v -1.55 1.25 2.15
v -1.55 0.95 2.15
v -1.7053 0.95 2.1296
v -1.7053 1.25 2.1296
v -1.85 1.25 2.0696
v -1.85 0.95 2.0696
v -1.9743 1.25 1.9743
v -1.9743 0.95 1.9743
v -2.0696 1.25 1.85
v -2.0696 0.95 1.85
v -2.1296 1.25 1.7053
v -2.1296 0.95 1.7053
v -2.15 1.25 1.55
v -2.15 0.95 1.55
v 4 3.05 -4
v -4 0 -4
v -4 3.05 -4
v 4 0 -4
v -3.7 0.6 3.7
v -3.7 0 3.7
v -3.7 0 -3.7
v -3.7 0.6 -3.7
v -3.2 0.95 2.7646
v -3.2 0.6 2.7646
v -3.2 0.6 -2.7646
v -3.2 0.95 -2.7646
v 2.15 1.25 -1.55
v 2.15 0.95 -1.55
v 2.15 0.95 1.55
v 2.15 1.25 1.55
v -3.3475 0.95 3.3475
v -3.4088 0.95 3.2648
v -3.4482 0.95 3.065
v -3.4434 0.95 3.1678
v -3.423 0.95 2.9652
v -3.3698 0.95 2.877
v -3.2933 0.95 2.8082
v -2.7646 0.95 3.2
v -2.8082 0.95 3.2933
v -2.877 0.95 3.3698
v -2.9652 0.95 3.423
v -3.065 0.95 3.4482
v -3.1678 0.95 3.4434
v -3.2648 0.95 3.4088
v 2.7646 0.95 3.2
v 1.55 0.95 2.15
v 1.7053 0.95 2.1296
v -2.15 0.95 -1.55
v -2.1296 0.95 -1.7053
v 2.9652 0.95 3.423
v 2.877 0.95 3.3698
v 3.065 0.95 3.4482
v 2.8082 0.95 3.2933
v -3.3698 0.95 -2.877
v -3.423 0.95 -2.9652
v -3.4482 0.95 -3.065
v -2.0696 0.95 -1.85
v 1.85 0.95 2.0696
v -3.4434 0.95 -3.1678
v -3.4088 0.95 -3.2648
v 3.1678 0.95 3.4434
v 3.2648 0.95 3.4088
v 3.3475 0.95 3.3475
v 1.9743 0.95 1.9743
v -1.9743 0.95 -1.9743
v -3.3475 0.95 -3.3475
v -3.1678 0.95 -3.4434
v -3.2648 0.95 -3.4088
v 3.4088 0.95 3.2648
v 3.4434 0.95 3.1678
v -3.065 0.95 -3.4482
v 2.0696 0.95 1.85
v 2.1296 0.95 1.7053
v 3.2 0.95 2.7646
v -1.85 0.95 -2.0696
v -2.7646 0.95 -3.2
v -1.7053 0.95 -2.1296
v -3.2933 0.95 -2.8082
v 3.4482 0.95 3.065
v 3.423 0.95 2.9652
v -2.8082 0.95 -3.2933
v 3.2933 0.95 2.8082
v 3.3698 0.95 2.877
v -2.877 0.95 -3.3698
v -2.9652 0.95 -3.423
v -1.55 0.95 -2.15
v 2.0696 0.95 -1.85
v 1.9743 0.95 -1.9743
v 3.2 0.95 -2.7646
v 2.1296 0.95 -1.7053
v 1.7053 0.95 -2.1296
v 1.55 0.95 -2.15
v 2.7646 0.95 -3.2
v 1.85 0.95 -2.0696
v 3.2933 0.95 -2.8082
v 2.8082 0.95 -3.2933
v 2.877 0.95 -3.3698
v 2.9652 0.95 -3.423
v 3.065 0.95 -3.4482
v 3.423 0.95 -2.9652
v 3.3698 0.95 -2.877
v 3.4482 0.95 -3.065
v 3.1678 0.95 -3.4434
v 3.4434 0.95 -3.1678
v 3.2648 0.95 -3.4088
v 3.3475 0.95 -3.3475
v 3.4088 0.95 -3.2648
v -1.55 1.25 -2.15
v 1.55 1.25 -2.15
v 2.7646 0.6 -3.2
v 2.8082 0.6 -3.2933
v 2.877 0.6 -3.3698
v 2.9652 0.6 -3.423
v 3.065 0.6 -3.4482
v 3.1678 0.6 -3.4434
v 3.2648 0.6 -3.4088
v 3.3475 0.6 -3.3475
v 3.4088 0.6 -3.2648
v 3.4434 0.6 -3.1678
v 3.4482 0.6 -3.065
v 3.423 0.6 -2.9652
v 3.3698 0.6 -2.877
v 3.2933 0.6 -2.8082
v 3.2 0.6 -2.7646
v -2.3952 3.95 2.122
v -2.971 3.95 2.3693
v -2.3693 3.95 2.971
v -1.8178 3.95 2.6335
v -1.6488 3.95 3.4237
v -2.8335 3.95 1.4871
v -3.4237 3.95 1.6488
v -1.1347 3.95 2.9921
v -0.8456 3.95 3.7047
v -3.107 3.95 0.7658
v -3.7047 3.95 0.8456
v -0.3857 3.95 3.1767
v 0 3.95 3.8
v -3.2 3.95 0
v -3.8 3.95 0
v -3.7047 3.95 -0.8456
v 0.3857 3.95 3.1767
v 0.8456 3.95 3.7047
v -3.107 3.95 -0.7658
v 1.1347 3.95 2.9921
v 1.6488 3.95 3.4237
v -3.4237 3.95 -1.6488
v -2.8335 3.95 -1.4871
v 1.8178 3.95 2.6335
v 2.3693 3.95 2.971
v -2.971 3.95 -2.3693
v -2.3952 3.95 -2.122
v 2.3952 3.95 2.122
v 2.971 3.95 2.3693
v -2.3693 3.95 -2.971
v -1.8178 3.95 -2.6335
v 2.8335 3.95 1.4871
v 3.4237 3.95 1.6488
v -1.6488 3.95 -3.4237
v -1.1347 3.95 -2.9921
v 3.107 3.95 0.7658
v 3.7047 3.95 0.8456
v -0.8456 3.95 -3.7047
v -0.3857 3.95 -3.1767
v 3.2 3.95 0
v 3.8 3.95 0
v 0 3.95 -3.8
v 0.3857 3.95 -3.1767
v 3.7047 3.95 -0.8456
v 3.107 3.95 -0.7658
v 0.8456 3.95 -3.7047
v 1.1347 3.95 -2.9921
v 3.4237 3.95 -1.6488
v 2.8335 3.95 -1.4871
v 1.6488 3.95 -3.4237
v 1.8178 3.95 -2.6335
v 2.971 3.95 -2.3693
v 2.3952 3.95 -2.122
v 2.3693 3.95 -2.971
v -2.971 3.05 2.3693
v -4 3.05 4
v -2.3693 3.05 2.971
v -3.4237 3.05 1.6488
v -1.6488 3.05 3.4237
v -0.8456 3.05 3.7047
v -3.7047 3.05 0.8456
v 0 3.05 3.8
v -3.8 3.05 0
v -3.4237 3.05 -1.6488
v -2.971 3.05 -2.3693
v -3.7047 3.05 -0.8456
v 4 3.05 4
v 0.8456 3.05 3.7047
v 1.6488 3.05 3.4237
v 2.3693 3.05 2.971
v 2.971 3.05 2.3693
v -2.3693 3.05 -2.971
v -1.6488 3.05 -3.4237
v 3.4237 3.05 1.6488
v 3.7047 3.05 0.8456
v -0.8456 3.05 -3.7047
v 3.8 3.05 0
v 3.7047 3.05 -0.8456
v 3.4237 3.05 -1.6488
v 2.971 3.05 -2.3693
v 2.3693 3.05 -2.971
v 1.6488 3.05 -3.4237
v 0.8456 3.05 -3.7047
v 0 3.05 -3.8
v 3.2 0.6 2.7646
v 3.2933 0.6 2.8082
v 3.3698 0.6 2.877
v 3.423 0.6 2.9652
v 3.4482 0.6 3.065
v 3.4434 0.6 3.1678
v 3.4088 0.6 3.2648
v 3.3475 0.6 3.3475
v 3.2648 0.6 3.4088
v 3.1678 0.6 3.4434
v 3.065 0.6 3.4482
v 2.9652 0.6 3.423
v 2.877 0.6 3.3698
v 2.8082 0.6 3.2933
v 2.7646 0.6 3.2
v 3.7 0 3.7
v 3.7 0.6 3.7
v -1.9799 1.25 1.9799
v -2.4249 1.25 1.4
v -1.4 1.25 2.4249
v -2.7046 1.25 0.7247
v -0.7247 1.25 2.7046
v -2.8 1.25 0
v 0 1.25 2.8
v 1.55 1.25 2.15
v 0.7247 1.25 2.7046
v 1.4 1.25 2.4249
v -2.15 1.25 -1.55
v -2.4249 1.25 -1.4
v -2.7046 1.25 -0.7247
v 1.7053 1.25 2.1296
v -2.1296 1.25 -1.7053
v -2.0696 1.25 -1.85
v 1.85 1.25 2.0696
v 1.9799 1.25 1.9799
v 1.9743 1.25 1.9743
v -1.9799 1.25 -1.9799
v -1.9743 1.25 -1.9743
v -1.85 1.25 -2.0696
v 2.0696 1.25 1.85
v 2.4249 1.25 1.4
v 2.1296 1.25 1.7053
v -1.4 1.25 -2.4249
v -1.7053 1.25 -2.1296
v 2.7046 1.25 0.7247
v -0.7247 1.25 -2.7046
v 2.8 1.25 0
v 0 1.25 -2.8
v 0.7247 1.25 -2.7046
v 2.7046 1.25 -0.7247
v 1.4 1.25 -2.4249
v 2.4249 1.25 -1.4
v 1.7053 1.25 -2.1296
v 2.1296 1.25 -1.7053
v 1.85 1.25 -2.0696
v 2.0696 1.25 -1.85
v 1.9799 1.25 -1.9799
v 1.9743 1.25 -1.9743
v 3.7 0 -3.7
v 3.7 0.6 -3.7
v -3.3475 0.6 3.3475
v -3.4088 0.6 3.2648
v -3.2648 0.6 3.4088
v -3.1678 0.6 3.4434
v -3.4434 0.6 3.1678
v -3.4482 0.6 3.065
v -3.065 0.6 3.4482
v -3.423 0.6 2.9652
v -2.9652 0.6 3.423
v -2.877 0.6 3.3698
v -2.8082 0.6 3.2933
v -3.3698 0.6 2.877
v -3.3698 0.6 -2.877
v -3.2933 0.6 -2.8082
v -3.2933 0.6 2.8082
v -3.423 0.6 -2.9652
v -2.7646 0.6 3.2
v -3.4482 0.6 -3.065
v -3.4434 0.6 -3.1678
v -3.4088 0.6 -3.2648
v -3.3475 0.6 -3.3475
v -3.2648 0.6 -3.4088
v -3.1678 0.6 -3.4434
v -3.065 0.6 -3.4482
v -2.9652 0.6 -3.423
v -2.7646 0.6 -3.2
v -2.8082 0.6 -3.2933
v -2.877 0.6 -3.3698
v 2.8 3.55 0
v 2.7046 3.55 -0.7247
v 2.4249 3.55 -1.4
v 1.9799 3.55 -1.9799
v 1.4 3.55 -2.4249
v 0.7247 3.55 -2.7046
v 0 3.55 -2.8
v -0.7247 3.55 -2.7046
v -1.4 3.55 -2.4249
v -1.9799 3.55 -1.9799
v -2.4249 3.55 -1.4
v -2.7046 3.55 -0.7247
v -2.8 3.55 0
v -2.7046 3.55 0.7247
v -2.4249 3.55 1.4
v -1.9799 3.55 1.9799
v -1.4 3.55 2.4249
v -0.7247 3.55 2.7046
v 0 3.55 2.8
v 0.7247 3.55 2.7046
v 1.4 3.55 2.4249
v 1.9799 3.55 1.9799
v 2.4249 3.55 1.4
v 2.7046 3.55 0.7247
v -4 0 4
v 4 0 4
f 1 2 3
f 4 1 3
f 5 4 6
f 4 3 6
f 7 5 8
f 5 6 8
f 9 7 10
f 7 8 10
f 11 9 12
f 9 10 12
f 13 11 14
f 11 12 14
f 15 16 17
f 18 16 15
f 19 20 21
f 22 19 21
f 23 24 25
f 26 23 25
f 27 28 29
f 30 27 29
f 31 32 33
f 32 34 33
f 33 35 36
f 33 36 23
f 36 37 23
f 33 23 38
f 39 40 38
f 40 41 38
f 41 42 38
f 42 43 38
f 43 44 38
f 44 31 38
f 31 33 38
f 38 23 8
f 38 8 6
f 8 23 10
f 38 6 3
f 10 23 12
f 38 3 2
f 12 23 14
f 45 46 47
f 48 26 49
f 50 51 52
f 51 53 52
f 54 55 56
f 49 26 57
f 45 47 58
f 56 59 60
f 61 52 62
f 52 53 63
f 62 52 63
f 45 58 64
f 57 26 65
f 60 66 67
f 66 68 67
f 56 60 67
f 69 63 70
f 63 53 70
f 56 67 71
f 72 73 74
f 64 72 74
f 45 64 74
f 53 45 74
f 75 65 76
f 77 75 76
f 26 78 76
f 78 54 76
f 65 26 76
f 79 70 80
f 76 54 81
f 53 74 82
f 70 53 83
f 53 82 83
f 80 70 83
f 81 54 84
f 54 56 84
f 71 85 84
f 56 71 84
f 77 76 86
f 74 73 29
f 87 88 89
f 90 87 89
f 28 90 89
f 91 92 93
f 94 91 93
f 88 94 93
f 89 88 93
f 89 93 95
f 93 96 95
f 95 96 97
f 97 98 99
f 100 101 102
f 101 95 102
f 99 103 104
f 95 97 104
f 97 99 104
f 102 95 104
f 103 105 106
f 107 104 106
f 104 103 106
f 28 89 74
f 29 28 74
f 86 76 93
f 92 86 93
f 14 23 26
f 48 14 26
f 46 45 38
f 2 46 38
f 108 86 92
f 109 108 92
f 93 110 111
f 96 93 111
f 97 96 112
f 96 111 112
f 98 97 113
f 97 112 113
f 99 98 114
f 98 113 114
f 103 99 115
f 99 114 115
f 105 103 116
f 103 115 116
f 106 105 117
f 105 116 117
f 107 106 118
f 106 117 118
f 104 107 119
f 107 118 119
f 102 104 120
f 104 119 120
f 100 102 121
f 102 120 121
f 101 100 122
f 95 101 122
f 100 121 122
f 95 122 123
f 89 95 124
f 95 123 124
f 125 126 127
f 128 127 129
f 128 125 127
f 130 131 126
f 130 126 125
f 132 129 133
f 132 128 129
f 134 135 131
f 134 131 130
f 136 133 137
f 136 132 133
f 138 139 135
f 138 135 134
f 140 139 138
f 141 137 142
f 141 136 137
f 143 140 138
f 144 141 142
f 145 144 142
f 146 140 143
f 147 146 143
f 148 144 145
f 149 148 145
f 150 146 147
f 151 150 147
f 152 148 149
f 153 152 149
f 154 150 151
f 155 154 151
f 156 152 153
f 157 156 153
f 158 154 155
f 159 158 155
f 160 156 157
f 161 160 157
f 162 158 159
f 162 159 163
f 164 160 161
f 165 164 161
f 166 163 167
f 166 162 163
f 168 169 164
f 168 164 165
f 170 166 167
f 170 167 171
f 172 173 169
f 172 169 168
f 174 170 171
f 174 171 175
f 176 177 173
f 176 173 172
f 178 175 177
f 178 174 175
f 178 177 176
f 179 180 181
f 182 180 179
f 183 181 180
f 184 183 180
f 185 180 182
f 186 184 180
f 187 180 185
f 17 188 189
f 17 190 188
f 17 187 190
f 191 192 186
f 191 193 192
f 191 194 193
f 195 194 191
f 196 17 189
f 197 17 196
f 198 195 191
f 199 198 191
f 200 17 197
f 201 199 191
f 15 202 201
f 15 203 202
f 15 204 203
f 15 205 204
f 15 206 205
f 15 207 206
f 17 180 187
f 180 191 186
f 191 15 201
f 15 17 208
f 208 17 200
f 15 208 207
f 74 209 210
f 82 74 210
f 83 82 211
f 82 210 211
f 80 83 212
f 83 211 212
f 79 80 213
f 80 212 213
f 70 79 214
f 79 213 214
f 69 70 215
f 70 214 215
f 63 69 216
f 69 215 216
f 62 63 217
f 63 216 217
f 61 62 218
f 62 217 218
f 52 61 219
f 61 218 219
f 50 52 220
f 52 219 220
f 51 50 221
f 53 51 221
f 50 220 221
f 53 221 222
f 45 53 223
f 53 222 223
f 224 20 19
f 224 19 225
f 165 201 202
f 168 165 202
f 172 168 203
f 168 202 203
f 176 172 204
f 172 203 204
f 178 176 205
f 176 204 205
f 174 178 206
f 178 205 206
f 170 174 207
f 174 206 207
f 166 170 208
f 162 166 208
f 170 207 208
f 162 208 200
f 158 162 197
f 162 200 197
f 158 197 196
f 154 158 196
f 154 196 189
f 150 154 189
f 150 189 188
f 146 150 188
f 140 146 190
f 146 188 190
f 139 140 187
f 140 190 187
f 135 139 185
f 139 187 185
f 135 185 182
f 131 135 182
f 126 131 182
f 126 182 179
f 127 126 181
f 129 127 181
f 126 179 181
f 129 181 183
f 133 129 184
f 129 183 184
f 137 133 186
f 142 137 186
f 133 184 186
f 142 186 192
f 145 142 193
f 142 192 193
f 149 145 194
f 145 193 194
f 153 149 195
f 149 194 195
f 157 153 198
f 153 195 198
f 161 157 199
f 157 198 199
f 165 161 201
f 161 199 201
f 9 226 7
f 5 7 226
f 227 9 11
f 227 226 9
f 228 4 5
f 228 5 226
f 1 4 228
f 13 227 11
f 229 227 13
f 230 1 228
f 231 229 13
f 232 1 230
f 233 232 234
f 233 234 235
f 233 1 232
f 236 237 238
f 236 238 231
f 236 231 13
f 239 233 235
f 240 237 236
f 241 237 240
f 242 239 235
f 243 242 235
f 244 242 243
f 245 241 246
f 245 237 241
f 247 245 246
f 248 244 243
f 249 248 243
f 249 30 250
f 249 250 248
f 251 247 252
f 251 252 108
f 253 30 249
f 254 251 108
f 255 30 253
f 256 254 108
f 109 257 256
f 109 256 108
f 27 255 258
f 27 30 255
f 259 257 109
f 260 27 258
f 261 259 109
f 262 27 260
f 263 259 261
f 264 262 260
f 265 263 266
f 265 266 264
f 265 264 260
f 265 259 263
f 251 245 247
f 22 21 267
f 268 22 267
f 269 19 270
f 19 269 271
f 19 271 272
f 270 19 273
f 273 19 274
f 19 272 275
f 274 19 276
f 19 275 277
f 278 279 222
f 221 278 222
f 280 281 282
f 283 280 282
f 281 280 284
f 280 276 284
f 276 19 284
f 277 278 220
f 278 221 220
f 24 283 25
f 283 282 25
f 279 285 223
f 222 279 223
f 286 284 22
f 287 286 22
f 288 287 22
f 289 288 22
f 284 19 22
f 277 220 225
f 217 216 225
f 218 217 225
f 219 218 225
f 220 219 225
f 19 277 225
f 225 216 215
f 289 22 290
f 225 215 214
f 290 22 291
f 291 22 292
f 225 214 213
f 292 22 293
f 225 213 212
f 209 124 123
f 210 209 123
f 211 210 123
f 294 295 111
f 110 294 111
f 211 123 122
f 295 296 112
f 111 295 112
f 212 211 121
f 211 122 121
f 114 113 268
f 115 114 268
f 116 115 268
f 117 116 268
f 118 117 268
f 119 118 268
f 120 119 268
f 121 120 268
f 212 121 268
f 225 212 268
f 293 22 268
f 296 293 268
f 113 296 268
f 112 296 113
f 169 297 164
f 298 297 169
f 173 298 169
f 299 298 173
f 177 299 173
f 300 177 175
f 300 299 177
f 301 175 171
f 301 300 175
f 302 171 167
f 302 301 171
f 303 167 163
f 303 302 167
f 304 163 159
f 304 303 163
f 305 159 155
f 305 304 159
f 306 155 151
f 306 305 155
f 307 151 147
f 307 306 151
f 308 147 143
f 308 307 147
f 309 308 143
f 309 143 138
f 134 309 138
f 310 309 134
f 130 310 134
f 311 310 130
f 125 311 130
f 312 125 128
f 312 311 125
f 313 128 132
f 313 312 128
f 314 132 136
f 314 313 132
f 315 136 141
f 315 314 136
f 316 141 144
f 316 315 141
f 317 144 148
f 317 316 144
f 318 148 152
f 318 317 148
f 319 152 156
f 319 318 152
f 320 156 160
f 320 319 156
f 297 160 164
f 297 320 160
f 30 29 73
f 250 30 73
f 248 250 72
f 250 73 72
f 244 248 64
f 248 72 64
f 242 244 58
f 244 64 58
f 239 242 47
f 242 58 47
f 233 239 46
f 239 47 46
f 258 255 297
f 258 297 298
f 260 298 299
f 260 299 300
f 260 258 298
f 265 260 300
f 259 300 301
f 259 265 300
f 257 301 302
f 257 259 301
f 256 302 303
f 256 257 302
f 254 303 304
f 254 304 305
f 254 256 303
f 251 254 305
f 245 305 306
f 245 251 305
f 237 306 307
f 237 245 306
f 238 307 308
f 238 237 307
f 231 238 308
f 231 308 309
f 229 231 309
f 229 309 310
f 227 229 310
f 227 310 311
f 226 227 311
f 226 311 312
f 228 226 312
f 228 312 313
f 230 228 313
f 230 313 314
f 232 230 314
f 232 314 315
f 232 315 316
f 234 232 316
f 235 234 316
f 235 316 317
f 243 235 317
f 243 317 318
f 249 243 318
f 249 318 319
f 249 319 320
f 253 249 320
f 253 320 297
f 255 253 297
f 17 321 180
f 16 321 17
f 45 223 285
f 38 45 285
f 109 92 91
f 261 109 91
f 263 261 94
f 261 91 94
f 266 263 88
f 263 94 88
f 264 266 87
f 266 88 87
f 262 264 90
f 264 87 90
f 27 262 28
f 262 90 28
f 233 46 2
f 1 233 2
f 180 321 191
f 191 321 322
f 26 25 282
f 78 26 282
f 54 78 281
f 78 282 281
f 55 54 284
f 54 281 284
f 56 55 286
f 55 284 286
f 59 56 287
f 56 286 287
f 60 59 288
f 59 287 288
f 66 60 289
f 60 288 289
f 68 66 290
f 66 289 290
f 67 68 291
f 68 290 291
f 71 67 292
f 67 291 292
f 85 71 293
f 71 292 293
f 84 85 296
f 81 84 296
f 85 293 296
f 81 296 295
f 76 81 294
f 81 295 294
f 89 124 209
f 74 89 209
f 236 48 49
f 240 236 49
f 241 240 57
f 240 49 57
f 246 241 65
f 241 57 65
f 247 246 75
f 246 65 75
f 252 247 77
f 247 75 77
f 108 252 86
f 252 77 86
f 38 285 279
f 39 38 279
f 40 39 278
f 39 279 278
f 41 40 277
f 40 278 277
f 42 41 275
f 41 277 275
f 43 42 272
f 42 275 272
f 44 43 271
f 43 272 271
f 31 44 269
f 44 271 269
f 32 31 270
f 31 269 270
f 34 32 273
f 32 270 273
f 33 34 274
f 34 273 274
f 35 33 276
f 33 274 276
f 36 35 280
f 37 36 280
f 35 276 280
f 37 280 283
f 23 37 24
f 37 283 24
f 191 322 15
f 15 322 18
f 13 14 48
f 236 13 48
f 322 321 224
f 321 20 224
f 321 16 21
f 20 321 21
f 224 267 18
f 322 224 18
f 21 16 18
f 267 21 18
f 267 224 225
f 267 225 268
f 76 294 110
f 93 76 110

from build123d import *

# Parameters (mm, degrees)
SKIZZE2_W                       = 8
SKIZZE2_H                       = 8
SKIZZE2_W_2                     = 7.4
SKIZZE2_H_2                     = 7.4
AUFSATZ_LINEAR_AUSTRAGEN1_DEPTH = 0.6
SKIZZE5_W                       = 8
SKIZZE5_H                       = 8
AUFSATZ_LINEAR_AUSTRAGEN3_DEPTH = 0.35
SKIZZE4_W                       = 8
SKIZZE4_H                       = 8
AUFSATZ_LINEAR_AUSTRAGEN2_DEPTH = 0.3
SKIZZE7_W                       = 8
SKIZZE7_H                       = 8
SKIZZE7_R                       = 2.8
AUFSATZ_LINEAR_AUSTRAGEN4_DEPTH = 1.8
SKIZZE8_R                       = 3.8
SKIZZE8_R_2                     = 2.8
AUFSATZ_LINEAR_AUSTRAGEN5_DEPTH = 0.9
FASE1_SIZE                      = 0.4


with BuildPart() as part:
    # Skizze2 → Aufsatz-Linear austragen1 (new body)
    with BuildSketch(Plane(origin=(0, 0, 0), x_dir=(1, 0, 0), z_dir=(0, 1, 0))):
        Rectangle(SKIZZE2_W, SKIZZE2_H)
        Rectangle(SKIZZE2_W_2, SKIZZE2_H_2, mode=Mode.SUBTRACT)
    extrude(amount=AUFSATZ_LINEAR_AUSTRAGEN1_DEPTH)

    # Skizze5 → Aufsatz-Linear austragen3 (add)
    with BuildSketch(Plane(origin=(0, 0.6, 0), x_dir=(1, 0, 0), z_dir=(0, 1, 0))):
        Rectangle(SKIZZE5_W, SKIZZE5_H)
        with BuildLine():
            Line((-2.764589803, 3.2), (2.764589803, 3.2))
            ThreePointArc((2.764589803, 3.2), (3.347487373, 3.347487373), (3.2, 2.764589803))
            Line((3.2, 2.764589803), (3.2, -2.764589803))
            ThreePointArc((3.2, -2.764589803), (3.347487373, -3.347487373), (2.764589803, -3.2))
            Line((2.764589803, -3.2), (-2.764589803, -3.2))
            ThreePointArc((-2.764589803, -3.2), (-3.347487373, -3.347487373), (-3.2, -2.764589803))
            Line((-3.2, -2.764589803), (-3.2, 2.764589803))
            ThreePointArc((-3.2, 2.764589803), (-3.347487373, 3.347487373), (-2.764589803, 3.2))
        make_face(mode=Mode.SUBTRACT)
    extrude(amount=AUFSATZ_LINEAR_AUSTRAGEN3_DEPTH)

    # Skizze4 → Aufsatz-Linear austragen2 (add)
    with BuildSketch(Plane(origin=(0, 0.95, 0), x_dir=(1, 0, 0), z_dir=(0, 1, 0))):
        Rectangle(SKIZZE4_W, SKIZZE4_H)
        with BuildLine():
            Line((-1.55, 2.15), (1.55, 2.15))
            ThreePointArc((1.55, 2.15), (1.974264069, 1.974264069), (2.15, 1.55))
            Line((2.15, 1.55), (2.15, -1.55))
            ThreePointArc((2.15, -1.55), (1.974264069, -1.974264069), (1.55, -2.15))
            Line((1.55, -2.15), (-1.55, -2.15))
            ThreePointArc((-1.55, -2.15), (-1.974264069, -1.974264069), (-2.15, -1.55))
            Line((-2.15, -1.55), (-2.15, 1.55))
            ThreePointArc((-2.15, 1.55), (-1.974264069, 1.974264069), (-1.55, 2.15))
        make_face(mode=Mode.SUBTRACT)
    extrude(amount=AUFSATZ_LINEAR_AUSTRAGEN2_DEPTH)

    # Skizze7 → Aufsatz-Linear austragen4 (add)
    with BuildSketch(Plane(origin=(0, 1.25, 0), x_dir=(1, 0, 0), z_dir=(0, 1, 0))):
        Rectangle(SKIZZE7_W, SKIZZE7_H)
        Circle(SKIZZE7_R, mode=Mode.SUBTRACT)
    extrude(amount=AUFSATZ_LINEAR_AUSTRAGEN4_DEPTH)

    # Skizze8 → Aufsatz-Linear austragen5 (add)
    with BuildSketch(Plane(origin=(0, 3.05, 0), x_dir=(1, 0, 0), z_dir=(0, 1, 0))):
        Circle(SKIZZE8_R)
        Circle(SKIZZE8_R_2, mode=Mode.SUBTRACT)
    extrude(amount=AUFSATZ_LINEAR_AUSTRAGEN5_DEPTH)

    # Fase1
    fase1_edges = [part.edges().sort_by_distance(p)[0] for p in [
        (-2.8, 3.95, 0),
    ]]
    chamfer(fase1_edges, length=FASE1_SIZE)


solid = part.part
